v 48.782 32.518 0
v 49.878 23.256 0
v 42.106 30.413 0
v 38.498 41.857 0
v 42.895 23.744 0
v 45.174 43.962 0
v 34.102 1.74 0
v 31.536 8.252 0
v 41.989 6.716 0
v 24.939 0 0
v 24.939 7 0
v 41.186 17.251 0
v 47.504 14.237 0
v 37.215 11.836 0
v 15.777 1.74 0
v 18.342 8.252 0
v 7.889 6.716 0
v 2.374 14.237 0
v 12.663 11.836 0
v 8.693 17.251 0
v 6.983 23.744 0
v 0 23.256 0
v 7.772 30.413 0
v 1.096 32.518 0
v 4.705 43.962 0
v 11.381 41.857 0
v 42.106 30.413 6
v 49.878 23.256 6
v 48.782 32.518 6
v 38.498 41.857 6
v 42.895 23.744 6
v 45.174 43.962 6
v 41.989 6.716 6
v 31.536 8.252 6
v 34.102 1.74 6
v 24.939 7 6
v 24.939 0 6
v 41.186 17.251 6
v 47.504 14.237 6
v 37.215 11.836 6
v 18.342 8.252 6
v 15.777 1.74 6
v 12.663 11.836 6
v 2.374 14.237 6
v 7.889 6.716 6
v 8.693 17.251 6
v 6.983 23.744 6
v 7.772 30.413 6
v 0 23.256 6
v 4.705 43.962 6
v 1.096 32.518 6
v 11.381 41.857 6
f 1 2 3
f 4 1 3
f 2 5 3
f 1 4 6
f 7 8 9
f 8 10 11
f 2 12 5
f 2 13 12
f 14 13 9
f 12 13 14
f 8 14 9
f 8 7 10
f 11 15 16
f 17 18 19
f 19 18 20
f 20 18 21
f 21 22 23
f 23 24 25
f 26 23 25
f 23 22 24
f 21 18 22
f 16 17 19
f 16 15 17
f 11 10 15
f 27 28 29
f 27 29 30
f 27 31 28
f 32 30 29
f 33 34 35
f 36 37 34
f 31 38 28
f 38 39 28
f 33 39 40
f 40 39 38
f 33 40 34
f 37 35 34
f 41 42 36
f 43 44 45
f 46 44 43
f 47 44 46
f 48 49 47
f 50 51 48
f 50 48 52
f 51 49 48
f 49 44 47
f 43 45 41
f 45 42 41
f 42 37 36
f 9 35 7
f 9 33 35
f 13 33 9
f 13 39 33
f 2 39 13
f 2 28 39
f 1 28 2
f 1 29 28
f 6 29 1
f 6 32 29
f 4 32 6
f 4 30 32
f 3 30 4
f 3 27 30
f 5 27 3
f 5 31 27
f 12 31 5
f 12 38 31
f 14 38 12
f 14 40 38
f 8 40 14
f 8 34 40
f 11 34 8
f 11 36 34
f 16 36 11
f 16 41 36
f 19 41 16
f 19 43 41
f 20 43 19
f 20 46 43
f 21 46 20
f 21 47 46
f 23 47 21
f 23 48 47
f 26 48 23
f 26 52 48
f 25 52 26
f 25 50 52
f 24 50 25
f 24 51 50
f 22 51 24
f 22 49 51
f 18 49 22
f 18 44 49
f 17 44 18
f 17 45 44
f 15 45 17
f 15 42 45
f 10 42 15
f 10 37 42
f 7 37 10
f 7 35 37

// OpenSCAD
$fn = 32;

// ----------------------------------------------------------------------
// Clip blank: omega clip, 6 mm thick
// ----------------------------------------------------------------------

// --- parameters (mm) ---
profile_height = 6;       // extrusion height
profile_points = 26;      // points of the closed outline

profile = [[1.096, 32.518], [0, 23.256], [2.374, 14.237], [7.889, 6.716], [15.777, 1.74], [24.939, 0], [34.102, 1.74], [41.989, 6.716], [47.504, 14.237], [49.878, 23.256], [48.782, 32.518], [45.174, 43.962], [38.498, 41.857], [42.106, 30.413], [42.895, 23.744], [41.186, 17.251], [37.215, 11.836], [31.536, 8.252], [24.939, 7], [18.342, 8.252], [12.663, 11.836], [8.693, 17.251], [6.983, 23.744], [7.772, 30.413], [11.381, 41.857], [4.705, 43.962]];  // single closed polygon, 26 points, counter clockwise

// --- the one profile operation ---
linear_extrude(height = profile_height) polygon(points = profile);
